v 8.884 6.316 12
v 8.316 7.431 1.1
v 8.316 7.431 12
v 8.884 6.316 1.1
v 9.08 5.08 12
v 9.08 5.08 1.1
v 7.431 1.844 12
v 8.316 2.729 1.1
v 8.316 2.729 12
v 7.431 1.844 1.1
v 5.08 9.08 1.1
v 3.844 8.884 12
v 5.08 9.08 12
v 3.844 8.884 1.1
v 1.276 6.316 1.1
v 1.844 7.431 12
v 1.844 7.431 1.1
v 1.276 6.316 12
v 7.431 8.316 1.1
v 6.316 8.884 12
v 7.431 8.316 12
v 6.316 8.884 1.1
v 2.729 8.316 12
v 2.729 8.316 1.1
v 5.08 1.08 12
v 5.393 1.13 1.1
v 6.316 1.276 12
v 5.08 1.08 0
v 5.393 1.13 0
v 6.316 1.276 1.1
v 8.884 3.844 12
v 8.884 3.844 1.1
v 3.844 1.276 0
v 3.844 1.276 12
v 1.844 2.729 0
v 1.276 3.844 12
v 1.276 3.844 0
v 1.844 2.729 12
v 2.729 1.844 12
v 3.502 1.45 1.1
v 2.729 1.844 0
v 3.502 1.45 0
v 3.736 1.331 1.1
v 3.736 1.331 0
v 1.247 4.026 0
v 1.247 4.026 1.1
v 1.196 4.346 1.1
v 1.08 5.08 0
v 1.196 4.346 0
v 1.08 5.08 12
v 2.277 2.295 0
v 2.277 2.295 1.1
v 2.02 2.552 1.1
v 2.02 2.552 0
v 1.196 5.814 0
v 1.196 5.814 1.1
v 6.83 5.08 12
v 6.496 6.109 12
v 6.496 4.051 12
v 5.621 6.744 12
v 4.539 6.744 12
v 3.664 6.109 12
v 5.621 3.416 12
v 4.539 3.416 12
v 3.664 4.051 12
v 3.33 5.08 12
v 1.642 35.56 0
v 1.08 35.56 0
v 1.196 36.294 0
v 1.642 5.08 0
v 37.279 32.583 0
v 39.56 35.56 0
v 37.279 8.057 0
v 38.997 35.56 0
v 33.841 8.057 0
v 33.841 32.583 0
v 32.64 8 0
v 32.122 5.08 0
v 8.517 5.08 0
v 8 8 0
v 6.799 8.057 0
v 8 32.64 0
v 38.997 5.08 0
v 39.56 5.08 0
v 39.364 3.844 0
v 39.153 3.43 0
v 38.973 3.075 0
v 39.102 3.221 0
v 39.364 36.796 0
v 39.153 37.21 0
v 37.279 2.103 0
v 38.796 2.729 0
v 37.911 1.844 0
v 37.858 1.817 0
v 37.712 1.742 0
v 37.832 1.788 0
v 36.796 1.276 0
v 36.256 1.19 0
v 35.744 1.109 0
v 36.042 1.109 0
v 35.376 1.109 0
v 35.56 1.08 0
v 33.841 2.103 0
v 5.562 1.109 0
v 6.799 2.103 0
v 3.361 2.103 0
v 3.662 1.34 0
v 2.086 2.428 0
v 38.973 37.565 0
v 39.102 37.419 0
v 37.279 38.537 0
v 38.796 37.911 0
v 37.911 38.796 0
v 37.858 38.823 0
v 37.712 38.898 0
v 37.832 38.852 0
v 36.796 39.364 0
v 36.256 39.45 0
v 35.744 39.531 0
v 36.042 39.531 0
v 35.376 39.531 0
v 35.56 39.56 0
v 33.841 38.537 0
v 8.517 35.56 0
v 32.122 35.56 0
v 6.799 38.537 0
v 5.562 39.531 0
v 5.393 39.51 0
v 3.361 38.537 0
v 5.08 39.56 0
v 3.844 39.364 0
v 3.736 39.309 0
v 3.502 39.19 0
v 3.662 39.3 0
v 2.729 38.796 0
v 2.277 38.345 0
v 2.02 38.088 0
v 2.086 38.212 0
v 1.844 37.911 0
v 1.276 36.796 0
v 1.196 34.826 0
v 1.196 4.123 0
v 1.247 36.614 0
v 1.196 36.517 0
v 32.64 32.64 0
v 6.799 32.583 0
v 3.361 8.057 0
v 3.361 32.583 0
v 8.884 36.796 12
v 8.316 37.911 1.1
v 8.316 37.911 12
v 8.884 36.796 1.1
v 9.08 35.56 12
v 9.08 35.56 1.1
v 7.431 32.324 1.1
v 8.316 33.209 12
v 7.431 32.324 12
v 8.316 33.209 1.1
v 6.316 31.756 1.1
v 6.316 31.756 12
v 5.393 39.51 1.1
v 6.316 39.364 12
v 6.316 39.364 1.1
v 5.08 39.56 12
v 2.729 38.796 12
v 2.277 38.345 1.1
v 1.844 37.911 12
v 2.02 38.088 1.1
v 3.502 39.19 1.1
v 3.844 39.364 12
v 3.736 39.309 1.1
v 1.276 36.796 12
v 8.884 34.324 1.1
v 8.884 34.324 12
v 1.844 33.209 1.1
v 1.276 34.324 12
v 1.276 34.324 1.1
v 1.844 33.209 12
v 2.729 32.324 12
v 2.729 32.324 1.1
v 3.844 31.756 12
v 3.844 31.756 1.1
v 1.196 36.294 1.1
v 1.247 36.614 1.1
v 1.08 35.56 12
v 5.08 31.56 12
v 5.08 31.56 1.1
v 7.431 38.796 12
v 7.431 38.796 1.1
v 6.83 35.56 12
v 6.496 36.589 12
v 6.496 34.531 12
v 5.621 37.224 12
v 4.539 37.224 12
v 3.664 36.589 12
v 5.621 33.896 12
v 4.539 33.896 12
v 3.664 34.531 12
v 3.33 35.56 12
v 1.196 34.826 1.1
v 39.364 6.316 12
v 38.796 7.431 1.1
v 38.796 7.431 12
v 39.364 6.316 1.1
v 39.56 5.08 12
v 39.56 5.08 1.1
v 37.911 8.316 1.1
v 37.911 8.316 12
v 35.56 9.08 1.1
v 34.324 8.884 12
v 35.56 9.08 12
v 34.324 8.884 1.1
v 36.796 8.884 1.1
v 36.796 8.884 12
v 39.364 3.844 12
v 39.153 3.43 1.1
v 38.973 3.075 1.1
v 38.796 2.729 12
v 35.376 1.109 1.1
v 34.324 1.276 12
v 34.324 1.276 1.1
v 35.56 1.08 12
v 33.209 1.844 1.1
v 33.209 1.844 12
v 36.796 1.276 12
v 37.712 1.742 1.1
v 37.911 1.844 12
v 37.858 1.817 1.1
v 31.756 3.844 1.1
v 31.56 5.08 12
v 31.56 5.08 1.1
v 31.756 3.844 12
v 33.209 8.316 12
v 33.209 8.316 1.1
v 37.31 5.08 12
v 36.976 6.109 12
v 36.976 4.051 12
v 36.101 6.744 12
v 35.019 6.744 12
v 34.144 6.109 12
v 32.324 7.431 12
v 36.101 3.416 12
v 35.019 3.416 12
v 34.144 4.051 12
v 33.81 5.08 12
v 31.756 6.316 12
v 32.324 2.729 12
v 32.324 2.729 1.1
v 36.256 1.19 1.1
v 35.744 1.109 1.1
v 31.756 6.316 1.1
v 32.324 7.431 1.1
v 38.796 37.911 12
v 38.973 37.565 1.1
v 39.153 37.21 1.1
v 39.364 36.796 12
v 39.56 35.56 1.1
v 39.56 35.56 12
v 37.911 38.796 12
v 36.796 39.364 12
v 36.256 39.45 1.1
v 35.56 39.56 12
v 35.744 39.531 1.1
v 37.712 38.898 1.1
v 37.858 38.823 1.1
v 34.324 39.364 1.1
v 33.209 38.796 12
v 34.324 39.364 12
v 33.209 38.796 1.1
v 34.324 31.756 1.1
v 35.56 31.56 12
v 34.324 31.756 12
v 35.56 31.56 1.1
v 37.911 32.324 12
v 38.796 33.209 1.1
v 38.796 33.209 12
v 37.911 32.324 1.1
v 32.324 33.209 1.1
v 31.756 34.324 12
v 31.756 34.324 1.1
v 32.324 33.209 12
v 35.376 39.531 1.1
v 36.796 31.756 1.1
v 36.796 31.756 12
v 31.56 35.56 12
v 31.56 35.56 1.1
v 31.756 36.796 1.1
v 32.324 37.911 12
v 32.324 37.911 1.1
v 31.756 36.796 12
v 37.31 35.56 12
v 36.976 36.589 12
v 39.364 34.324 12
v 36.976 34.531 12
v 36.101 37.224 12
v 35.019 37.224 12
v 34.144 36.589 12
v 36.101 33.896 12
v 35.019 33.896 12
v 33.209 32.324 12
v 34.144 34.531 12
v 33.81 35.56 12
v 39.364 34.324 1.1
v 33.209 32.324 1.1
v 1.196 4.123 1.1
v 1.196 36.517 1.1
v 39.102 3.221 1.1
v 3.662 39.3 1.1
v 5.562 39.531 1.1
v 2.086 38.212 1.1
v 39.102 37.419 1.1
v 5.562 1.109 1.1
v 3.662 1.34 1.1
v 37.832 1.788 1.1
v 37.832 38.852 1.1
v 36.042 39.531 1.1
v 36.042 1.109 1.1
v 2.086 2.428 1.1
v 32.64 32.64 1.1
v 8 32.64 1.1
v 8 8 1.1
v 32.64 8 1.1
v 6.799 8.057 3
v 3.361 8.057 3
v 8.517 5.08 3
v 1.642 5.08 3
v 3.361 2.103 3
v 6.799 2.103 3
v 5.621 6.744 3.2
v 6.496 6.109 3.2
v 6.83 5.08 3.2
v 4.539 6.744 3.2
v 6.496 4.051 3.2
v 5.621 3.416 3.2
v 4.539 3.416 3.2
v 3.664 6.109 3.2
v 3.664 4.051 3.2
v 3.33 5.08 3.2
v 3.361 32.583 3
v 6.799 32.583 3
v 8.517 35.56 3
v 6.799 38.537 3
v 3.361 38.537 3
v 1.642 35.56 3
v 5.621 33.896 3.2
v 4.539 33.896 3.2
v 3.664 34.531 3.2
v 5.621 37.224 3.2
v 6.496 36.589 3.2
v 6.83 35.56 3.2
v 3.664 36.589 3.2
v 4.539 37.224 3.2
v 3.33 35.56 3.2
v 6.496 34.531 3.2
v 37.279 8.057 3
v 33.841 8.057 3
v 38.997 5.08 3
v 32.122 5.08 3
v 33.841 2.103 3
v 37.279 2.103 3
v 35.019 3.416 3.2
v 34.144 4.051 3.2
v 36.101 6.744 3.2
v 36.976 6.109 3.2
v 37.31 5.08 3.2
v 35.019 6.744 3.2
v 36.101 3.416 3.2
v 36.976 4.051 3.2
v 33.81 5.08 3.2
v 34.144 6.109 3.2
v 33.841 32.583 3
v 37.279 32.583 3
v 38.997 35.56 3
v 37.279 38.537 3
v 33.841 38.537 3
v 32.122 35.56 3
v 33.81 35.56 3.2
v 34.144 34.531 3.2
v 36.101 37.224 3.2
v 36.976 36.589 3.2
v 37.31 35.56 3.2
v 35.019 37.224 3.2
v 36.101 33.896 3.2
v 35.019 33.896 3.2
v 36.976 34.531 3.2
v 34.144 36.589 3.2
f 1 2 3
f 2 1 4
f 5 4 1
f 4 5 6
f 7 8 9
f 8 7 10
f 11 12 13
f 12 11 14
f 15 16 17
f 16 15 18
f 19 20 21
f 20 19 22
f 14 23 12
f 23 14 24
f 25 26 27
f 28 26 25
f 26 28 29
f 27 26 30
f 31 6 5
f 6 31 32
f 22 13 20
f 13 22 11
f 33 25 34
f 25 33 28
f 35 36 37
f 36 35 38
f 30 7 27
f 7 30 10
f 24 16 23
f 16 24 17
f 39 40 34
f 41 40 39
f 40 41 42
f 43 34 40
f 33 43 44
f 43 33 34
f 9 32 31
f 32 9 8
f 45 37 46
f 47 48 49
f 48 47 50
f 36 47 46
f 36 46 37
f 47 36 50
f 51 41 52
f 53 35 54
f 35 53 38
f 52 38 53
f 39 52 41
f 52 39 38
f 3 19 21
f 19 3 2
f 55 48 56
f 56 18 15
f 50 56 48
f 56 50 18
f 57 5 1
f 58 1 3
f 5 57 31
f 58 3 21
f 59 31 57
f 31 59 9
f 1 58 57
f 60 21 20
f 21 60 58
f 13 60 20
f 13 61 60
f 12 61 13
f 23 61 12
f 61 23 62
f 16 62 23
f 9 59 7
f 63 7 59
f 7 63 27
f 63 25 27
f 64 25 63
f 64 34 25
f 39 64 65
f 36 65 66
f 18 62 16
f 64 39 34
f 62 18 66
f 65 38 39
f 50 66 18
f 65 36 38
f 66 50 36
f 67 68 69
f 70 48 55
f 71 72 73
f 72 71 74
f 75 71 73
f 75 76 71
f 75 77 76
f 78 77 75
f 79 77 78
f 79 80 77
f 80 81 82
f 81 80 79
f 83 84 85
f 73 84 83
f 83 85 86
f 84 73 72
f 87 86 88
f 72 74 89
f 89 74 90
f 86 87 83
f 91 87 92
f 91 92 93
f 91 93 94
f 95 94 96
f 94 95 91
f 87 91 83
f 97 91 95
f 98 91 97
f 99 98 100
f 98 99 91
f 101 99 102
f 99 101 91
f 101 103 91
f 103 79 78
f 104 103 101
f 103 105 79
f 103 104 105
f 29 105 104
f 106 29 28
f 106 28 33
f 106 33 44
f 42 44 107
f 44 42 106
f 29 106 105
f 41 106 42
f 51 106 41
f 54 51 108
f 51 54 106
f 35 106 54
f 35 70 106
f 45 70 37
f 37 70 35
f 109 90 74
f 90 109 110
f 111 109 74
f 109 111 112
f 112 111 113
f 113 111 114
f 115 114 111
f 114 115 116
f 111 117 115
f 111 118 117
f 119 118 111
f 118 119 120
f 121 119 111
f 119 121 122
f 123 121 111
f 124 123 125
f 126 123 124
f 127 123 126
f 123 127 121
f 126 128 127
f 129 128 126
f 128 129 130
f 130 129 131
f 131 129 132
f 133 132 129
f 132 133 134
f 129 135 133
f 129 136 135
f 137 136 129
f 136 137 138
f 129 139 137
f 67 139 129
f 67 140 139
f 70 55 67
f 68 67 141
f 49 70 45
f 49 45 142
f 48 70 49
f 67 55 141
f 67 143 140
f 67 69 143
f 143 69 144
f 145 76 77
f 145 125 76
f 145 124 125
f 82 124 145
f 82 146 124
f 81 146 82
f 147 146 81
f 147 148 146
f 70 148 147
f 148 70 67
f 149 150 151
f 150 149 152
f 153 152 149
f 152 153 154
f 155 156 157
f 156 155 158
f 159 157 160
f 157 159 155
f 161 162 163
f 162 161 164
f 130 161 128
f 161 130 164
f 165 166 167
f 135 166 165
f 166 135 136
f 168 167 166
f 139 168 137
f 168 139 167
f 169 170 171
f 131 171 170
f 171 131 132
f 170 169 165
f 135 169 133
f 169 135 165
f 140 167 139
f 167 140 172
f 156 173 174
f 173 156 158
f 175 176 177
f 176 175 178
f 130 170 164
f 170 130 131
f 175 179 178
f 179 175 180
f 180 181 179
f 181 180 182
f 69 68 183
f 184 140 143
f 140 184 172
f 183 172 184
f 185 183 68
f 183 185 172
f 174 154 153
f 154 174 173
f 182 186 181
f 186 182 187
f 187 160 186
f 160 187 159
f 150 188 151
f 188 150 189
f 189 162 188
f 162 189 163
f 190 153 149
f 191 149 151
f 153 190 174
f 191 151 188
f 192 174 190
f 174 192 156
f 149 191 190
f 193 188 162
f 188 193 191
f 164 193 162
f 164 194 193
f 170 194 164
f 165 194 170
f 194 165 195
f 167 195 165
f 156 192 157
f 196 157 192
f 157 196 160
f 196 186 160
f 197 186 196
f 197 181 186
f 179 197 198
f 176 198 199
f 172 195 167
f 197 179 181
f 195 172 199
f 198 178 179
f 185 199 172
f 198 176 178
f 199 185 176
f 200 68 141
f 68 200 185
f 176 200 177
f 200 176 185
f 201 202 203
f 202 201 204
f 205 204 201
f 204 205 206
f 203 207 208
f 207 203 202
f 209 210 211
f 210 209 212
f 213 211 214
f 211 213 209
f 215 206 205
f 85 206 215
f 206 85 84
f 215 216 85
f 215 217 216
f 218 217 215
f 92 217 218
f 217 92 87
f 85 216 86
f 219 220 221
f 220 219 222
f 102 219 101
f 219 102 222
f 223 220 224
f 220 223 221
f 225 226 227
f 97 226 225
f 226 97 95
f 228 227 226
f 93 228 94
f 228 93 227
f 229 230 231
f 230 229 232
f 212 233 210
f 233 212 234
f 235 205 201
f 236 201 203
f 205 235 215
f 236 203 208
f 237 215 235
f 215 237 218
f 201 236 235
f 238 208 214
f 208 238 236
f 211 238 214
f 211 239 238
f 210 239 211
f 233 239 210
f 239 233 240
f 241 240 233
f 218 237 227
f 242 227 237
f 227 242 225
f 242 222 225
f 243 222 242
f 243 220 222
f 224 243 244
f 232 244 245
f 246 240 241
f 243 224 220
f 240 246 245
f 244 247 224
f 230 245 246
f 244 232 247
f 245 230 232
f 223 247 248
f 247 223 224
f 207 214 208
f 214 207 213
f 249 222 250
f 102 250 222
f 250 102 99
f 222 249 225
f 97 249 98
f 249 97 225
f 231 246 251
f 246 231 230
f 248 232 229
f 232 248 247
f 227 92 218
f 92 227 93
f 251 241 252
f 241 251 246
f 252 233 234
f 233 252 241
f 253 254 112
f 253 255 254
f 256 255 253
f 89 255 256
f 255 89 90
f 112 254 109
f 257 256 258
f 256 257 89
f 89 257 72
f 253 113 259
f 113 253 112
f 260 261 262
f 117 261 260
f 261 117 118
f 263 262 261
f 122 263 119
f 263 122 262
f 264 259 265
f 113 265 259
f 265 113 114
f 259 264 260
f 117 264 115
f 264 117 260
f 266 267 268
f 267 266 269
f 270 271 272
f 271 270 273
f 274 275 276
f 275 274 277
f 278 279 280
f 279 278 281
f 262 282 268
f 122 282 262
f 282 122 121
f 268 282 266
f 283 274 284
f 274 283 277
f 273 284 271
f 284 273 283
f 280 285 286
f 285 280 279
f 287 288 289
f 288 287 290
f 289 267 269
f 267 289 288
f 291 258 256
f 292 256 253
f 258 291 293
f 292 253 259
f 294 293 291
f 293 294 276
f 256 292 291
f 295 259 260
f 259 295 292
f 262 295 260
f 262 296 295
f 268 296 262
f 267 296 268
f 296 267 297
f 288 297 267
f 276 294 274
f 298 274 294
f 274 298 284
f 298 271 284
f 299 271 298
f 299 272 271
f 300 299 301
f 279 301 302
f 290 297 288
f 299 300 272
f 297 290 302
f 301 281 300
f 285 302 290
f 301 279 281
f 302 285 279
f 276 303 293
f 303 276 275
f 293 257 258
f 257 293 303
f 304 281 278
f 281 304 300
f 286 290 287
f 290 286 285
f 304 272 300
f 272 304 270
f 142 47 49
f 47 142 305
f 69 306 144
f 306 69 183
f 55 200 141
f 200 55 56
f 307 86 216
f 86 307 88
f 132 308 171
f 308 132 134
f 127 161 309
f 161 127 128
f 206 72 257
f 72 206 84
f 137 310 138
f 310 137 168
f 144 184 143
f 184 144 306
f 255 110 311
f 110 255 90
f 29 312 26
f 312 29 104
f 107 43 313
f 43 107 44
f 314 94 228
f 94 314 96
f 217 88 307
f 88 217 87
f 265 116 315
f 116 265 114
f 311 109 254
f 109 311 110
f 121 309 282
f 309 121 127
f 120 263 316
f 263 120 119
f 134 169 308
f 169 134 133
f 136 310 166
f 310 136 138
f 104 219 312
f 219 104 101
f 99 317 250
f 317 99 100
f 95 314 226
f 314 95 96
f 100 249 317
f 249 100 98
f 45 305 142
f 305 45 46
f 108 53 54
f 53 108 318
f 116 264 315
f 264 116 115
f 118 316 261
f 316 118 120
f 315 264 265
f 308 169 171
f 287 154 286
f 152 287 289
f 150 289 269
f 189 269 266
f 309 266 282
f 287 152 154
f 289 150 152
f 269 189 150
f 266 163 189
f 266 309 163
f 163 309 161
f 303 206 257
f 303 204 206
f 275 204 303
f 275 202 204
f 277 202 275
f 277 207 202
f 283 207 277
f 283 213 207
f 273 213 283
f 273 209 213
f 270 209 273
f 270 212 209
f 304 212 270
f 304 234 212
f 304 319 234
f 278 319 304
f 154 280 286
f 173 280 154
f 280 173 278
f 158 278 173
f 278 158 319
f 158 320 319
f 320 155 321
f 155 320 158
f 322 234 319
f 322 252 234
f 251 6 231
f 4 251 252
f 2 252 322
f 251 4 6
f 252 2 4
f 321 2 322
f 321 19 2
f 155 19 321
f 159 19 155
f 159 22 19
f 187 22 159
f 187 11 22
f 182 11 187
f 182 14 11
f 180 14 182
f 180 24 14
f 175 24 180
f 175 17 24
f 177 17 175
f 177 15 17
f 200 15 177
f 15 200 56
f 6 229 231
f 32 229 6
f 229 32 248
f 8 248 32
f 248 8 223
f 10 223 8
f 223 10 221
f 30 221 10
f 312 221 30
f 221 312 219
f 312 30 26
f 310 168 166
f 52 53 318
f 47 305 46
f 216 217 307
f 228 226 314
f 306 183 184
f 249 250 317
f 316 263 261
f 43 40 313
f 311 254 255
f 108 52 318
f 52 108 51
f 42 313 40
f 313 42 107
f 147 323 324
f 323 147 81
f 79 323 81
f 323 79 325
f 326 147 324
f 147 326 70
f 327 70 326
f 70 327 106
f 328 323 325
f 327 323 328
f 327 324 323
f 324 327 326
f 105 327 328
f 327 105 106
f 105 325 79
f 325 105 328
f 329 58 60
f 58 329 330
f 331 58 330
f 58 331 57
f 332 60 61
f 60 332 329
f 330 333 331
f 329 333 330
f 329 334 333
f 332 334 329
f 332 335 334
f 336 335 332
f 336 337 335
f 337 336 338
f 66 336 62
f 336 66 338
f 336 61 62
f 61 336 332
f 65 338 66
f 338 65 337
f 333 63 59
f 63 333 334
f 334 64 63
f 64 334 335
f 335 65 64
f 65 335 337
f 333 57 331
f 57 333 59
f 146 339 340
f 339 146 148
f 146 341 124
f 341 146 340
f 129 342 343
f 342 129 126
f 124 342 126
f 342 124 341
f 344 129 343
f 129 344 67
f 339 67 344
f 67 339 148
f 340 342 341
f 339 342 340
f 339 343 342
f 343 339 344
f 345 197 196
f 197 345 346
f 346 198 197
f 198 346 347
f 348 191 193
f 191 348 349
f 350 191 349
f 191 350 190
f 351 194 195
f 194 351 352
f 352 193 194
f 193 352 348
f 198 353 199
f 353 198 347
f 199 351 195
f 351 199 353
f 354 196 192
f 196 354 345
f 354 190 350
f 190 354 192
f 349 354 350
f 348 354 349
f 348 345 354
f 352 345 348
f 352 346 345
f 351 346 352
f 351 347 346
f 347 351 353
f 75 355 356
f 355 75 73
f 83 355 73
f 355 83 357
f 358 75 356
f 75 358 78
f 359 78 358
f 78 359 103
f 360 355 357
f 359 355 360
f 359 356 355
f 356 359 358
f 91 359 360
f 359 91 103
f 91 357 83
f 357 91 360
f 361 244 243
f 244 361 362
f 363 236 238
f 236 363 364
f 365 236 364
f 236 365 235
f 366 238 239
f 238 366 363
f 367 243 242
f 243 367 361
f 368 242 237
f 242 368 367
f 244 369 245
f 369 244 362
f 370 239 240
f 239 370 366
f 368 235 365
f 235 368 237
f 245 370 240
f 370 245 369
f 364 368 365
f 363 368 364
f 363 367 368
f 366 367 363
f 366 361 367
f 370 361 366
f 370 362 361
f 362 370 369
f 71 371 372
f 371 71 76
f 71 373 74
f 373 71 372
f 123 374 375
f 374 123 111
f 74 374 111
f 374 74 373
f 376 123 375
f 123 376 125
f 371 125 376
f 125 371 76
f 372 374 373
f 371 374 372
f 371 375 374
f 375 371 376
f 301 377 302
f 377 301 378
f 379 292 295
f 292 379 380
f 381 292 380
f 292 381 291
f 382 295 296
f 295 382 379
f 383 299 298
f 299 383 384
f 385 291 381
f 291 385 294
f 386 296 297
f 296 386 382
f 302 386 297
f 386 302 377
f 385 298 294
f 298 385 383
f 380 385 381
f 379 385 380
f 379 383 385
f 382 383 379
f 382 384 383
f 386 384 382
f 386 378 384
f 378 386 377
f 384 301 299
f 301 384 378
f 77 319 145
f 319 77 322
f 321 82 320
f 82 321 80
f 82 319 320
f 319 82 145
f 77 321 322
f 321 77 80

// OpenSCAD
x_holes = 4;
y_holes = 4;
MLAB_grid = 10.16;
pile_radius = 4;
pedestal_height = 12;   // designed for use the MLAB standard 20mm screws.
x_size = x_holes * MLAB_grid ;
y_size = y_holes * MLAB_grid ;
mount_hole = 3.5;
//nut_size = 6.8;  //size suitable for PLA material
nut_size = 6.7;  //size suitable for ABS material
clear = 0.175;


thickness = 1;

MLAB_grid_xoffset = MLAB_grid/2;
MLAB_grid_yoffset = MLAB_grid/2;

grid_list = [for (j = [MLAB_grid_xoffset : MLAB_grid: x_size], i = [MLAB_grid_yoffset :MLAB_grid: y_size]) 
if ((j>(x_size-10) && i>(y_size-10)) || (j<10 && i<10) || (j<10 && i>(y_size-10)) || (j>(y_size-10) && i<10) ) [j, i] ];


difference () {
    union () {
        for (j = grid_list) {
            translate (concat(j, [0]))
            cylinder (h = pedestal_height, r= pile_radius, $fn=20);
        }

            translate ([MLAB_grid_xoffset , MLAB_grid_yoffset , 0])
                minkowski() {
                cube([x_size - 2*(MLAB_grid/2 - pile_radius) - 2*pile_radius, y_size - 2*(MLAB_grid/2 - pile_radius) - 2*pile_radius, thickness]);          // base plastics brick
                cylinder(r=pile_radius,h=0.1);
            }
    }
    
    translate ([2*pile_radius, 2*pile_radius, 0]) // central hole in module support
        cube([x_size-4*pile_radius, y_size-4*pile_radius, 2*thickness]);          

    // MLAB grid holes
    for (j = grid_list) {
            translate (concat(j, [0]))
            cylinder (h = 3, r= (nut_size+clear)/2, $fn=6);
            translate (concat(j, [3.2]))  // one solid layer for slicer (the holes will be pierced on demand )
            cylinder (h = pedestal_height, r= mount_hole/2, $fn=10);
        }    
}
